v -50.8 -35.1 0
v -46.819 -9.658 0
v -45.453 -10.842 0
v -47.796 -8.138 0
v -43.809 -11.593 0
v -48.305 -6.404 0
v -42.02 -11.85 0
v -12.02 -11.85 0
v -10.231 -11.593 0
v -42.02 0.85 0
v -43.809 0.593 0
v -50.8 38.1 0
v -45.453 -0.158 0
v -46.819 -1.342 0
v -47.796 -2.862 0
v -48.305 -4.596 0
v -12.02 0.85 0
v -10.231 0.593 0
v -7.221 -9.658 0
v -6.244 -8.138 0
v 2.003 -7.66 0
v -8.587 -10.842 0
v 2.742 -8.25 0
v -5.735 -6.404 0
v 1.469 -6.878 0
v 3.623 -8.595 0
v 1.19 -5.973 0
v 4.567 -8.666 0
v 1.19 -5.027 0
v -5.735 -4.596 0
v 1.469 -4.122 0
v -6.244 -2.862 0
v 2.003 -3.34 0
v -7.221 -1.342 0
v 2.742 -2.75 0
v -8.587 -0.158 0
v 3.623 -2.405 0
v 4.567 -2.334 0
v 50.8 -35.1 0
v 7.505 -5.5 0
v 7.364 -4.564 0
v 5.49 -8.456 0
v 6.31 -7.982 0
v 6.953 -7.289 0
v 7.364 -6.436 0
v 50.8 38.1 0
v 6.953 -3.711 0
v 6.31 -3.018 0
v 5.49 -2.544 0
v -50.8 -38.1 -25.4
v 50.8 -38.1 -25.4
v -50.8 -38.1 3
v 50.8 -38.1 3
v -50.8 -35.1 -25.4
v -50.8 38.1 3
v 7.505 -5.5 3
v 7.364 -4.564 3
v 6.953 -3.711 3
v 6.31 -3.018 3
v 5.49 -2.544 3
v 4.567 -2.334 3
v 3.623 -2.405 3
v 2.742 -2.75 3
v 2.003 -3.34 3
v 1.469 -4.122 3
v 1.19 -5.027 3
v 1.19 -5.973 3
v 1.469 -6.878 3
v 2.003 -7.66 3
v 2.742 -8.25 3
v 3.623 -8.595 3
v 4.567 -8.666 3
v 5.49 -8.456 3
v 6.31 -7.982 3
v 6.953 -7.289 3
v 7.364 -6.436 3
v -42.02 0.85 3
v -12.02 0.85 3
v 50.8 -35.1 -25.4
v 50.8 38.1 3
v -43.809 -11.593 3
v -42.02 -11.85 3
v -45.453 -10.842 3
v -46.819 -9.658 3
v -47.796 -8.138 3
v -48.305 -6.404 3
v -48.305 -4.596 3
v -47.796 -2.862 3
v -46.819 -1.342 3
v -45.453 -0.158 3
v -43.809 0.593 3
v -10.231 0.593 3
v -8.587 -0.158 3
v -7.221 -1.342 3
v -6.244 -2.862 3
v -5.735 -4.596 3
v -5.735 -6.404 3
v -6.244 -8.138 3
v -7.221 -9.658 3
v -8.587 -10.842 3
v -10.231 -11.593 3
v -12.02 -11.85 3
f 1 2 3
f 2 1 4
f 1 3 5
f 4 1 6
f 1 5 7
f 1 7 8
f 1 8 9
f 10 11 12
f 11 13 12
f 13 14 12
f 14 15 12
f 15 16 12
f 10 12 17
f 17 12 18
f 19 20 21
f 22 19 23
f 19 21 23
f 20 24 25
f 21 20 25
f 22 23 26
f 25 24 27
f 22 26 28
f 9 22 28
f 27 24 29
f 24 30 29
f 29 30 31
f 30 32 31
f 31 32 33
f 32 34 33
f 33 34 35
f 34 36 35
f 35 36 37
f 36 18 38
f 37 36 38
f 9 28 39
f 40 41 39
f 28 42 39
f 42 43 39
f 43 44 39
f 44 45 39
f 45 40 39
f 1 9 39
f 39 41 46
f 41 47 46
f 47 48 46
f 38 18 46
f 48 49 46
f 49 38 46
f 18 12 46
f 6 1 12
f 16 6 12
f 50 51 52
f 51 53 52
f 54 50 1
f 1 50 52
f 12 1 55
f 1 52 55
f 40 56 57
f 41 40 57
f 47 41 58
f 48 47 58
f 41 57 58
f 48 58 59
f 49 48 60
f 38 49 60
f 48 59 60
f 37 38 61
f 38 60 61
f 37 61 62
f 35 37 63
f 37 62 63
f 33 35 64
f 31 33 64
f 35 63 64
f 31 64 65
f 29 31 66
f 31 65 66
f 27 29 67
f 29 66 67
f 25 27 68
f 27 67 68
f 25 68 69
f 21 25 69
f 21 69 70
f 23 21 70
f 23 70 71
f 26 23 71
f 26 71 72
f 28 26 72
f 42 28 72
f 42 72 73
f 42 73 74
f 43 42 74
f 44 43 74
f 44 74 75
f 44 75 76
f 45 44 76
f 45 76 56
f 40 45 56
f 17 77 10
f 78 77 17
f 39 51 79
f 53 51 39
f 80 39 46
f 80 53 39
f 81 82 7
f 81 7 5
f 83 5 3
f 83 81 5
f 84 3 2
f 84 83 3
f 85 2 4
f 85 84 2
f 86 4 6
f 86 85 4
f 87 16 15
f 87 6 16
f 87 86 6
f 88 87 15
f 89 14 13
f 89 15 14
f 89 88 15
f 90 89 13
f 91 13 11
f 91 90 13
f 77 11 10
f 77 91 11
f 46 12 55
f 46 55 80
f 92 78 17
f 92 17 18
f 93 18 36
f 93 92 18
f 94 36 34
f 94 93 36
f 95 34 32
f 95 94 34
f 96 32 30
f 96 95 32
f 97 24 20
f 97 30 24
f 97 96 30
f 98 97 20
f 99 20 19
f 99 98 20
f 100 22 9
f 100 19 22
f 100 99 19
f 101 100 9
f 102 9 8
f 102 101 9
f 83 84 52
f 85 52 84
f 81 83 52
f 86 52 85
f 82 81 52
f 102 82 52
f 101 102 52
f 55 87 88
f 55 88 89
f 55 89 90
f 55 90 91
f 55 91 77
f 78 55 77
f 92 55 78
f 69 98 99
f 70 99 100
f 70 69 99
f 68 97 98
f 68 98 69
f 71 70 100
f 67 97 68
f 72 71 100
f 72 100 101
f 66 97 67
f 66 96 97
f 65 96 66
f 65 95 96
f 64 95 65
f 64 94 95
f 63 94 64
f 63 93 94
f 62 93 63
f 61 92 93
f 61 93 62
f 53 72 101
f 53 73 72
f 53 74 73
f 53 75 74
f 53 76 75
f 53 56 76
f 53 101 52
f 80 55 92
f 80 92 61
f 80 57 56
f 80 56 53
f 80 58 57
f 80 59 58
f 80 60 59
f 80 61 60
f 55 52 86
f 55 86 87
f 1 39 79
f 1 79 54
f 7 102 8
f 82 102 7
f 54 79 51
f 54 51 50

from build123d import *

# Parameters (mm, degrees)
CROQUIS1_W              = 101.6
CROQUIS1_H              = 76.2
SALIENTE_EXTRUIR1_DEPTH = 3
CROQUIS2_W              = 101.6
CROQUIS2_H              = 3
SALIENTE_EXTRUIR2_DEPTH = 25.4
CROQUIS3_R              = 3.175
CORTAR_EXTRUIR1_DEPTH   = 70.561555474


with BuildPart() as part:
    # Croquis1 → Saliente-Extruir1 (new body)
    with BuildSketch(Plane.XY):
        Rectangle(CROQUIS1_W, CROQUIS1_H)
    extrude(amount=SALIENTE_EXTRUIR1_DEPTH)

    # Croquis2 → Saliente-Extruir2 (add)
    with BuildSketch(Plane(origin=(0, 0, 0), x_dir=(-1, 0, 0), z_dir=(0, 0, -1))):
        with Locations((0, -36.6)):
            Rectangle(CROQUIS2_W, CROQUIS2_H)
    extrude(amount=SALIENTE_EXTRUIR2_DEPTH)

    # Croquis3 → Cortar-Extruir1 (cut, through all)
    with BuildSketch(Plane.XY.offset(3)):
        with Locations((4.33, -5.5)):
            Circle(CROQUIS3_R)
        with BuildLine():
            Line((-42.02, 0.85), (-12.02, 0.85))
            ThreePointArc((-12.02, 0.85), (-5.67, -5.5), (-12.02, -11.85))
            Line((-12.02, -11.85), (-42.02, -11.85))
            ThreePointArc((-42.02, -11.85), (-48.37, -5.5), (-42.02, 0.85))
        make_face()
    extrude(amount=-CORTAR_EXTRUIR1_DEPTH, mode=Mode.SUBTRACT)


solid = part.part
